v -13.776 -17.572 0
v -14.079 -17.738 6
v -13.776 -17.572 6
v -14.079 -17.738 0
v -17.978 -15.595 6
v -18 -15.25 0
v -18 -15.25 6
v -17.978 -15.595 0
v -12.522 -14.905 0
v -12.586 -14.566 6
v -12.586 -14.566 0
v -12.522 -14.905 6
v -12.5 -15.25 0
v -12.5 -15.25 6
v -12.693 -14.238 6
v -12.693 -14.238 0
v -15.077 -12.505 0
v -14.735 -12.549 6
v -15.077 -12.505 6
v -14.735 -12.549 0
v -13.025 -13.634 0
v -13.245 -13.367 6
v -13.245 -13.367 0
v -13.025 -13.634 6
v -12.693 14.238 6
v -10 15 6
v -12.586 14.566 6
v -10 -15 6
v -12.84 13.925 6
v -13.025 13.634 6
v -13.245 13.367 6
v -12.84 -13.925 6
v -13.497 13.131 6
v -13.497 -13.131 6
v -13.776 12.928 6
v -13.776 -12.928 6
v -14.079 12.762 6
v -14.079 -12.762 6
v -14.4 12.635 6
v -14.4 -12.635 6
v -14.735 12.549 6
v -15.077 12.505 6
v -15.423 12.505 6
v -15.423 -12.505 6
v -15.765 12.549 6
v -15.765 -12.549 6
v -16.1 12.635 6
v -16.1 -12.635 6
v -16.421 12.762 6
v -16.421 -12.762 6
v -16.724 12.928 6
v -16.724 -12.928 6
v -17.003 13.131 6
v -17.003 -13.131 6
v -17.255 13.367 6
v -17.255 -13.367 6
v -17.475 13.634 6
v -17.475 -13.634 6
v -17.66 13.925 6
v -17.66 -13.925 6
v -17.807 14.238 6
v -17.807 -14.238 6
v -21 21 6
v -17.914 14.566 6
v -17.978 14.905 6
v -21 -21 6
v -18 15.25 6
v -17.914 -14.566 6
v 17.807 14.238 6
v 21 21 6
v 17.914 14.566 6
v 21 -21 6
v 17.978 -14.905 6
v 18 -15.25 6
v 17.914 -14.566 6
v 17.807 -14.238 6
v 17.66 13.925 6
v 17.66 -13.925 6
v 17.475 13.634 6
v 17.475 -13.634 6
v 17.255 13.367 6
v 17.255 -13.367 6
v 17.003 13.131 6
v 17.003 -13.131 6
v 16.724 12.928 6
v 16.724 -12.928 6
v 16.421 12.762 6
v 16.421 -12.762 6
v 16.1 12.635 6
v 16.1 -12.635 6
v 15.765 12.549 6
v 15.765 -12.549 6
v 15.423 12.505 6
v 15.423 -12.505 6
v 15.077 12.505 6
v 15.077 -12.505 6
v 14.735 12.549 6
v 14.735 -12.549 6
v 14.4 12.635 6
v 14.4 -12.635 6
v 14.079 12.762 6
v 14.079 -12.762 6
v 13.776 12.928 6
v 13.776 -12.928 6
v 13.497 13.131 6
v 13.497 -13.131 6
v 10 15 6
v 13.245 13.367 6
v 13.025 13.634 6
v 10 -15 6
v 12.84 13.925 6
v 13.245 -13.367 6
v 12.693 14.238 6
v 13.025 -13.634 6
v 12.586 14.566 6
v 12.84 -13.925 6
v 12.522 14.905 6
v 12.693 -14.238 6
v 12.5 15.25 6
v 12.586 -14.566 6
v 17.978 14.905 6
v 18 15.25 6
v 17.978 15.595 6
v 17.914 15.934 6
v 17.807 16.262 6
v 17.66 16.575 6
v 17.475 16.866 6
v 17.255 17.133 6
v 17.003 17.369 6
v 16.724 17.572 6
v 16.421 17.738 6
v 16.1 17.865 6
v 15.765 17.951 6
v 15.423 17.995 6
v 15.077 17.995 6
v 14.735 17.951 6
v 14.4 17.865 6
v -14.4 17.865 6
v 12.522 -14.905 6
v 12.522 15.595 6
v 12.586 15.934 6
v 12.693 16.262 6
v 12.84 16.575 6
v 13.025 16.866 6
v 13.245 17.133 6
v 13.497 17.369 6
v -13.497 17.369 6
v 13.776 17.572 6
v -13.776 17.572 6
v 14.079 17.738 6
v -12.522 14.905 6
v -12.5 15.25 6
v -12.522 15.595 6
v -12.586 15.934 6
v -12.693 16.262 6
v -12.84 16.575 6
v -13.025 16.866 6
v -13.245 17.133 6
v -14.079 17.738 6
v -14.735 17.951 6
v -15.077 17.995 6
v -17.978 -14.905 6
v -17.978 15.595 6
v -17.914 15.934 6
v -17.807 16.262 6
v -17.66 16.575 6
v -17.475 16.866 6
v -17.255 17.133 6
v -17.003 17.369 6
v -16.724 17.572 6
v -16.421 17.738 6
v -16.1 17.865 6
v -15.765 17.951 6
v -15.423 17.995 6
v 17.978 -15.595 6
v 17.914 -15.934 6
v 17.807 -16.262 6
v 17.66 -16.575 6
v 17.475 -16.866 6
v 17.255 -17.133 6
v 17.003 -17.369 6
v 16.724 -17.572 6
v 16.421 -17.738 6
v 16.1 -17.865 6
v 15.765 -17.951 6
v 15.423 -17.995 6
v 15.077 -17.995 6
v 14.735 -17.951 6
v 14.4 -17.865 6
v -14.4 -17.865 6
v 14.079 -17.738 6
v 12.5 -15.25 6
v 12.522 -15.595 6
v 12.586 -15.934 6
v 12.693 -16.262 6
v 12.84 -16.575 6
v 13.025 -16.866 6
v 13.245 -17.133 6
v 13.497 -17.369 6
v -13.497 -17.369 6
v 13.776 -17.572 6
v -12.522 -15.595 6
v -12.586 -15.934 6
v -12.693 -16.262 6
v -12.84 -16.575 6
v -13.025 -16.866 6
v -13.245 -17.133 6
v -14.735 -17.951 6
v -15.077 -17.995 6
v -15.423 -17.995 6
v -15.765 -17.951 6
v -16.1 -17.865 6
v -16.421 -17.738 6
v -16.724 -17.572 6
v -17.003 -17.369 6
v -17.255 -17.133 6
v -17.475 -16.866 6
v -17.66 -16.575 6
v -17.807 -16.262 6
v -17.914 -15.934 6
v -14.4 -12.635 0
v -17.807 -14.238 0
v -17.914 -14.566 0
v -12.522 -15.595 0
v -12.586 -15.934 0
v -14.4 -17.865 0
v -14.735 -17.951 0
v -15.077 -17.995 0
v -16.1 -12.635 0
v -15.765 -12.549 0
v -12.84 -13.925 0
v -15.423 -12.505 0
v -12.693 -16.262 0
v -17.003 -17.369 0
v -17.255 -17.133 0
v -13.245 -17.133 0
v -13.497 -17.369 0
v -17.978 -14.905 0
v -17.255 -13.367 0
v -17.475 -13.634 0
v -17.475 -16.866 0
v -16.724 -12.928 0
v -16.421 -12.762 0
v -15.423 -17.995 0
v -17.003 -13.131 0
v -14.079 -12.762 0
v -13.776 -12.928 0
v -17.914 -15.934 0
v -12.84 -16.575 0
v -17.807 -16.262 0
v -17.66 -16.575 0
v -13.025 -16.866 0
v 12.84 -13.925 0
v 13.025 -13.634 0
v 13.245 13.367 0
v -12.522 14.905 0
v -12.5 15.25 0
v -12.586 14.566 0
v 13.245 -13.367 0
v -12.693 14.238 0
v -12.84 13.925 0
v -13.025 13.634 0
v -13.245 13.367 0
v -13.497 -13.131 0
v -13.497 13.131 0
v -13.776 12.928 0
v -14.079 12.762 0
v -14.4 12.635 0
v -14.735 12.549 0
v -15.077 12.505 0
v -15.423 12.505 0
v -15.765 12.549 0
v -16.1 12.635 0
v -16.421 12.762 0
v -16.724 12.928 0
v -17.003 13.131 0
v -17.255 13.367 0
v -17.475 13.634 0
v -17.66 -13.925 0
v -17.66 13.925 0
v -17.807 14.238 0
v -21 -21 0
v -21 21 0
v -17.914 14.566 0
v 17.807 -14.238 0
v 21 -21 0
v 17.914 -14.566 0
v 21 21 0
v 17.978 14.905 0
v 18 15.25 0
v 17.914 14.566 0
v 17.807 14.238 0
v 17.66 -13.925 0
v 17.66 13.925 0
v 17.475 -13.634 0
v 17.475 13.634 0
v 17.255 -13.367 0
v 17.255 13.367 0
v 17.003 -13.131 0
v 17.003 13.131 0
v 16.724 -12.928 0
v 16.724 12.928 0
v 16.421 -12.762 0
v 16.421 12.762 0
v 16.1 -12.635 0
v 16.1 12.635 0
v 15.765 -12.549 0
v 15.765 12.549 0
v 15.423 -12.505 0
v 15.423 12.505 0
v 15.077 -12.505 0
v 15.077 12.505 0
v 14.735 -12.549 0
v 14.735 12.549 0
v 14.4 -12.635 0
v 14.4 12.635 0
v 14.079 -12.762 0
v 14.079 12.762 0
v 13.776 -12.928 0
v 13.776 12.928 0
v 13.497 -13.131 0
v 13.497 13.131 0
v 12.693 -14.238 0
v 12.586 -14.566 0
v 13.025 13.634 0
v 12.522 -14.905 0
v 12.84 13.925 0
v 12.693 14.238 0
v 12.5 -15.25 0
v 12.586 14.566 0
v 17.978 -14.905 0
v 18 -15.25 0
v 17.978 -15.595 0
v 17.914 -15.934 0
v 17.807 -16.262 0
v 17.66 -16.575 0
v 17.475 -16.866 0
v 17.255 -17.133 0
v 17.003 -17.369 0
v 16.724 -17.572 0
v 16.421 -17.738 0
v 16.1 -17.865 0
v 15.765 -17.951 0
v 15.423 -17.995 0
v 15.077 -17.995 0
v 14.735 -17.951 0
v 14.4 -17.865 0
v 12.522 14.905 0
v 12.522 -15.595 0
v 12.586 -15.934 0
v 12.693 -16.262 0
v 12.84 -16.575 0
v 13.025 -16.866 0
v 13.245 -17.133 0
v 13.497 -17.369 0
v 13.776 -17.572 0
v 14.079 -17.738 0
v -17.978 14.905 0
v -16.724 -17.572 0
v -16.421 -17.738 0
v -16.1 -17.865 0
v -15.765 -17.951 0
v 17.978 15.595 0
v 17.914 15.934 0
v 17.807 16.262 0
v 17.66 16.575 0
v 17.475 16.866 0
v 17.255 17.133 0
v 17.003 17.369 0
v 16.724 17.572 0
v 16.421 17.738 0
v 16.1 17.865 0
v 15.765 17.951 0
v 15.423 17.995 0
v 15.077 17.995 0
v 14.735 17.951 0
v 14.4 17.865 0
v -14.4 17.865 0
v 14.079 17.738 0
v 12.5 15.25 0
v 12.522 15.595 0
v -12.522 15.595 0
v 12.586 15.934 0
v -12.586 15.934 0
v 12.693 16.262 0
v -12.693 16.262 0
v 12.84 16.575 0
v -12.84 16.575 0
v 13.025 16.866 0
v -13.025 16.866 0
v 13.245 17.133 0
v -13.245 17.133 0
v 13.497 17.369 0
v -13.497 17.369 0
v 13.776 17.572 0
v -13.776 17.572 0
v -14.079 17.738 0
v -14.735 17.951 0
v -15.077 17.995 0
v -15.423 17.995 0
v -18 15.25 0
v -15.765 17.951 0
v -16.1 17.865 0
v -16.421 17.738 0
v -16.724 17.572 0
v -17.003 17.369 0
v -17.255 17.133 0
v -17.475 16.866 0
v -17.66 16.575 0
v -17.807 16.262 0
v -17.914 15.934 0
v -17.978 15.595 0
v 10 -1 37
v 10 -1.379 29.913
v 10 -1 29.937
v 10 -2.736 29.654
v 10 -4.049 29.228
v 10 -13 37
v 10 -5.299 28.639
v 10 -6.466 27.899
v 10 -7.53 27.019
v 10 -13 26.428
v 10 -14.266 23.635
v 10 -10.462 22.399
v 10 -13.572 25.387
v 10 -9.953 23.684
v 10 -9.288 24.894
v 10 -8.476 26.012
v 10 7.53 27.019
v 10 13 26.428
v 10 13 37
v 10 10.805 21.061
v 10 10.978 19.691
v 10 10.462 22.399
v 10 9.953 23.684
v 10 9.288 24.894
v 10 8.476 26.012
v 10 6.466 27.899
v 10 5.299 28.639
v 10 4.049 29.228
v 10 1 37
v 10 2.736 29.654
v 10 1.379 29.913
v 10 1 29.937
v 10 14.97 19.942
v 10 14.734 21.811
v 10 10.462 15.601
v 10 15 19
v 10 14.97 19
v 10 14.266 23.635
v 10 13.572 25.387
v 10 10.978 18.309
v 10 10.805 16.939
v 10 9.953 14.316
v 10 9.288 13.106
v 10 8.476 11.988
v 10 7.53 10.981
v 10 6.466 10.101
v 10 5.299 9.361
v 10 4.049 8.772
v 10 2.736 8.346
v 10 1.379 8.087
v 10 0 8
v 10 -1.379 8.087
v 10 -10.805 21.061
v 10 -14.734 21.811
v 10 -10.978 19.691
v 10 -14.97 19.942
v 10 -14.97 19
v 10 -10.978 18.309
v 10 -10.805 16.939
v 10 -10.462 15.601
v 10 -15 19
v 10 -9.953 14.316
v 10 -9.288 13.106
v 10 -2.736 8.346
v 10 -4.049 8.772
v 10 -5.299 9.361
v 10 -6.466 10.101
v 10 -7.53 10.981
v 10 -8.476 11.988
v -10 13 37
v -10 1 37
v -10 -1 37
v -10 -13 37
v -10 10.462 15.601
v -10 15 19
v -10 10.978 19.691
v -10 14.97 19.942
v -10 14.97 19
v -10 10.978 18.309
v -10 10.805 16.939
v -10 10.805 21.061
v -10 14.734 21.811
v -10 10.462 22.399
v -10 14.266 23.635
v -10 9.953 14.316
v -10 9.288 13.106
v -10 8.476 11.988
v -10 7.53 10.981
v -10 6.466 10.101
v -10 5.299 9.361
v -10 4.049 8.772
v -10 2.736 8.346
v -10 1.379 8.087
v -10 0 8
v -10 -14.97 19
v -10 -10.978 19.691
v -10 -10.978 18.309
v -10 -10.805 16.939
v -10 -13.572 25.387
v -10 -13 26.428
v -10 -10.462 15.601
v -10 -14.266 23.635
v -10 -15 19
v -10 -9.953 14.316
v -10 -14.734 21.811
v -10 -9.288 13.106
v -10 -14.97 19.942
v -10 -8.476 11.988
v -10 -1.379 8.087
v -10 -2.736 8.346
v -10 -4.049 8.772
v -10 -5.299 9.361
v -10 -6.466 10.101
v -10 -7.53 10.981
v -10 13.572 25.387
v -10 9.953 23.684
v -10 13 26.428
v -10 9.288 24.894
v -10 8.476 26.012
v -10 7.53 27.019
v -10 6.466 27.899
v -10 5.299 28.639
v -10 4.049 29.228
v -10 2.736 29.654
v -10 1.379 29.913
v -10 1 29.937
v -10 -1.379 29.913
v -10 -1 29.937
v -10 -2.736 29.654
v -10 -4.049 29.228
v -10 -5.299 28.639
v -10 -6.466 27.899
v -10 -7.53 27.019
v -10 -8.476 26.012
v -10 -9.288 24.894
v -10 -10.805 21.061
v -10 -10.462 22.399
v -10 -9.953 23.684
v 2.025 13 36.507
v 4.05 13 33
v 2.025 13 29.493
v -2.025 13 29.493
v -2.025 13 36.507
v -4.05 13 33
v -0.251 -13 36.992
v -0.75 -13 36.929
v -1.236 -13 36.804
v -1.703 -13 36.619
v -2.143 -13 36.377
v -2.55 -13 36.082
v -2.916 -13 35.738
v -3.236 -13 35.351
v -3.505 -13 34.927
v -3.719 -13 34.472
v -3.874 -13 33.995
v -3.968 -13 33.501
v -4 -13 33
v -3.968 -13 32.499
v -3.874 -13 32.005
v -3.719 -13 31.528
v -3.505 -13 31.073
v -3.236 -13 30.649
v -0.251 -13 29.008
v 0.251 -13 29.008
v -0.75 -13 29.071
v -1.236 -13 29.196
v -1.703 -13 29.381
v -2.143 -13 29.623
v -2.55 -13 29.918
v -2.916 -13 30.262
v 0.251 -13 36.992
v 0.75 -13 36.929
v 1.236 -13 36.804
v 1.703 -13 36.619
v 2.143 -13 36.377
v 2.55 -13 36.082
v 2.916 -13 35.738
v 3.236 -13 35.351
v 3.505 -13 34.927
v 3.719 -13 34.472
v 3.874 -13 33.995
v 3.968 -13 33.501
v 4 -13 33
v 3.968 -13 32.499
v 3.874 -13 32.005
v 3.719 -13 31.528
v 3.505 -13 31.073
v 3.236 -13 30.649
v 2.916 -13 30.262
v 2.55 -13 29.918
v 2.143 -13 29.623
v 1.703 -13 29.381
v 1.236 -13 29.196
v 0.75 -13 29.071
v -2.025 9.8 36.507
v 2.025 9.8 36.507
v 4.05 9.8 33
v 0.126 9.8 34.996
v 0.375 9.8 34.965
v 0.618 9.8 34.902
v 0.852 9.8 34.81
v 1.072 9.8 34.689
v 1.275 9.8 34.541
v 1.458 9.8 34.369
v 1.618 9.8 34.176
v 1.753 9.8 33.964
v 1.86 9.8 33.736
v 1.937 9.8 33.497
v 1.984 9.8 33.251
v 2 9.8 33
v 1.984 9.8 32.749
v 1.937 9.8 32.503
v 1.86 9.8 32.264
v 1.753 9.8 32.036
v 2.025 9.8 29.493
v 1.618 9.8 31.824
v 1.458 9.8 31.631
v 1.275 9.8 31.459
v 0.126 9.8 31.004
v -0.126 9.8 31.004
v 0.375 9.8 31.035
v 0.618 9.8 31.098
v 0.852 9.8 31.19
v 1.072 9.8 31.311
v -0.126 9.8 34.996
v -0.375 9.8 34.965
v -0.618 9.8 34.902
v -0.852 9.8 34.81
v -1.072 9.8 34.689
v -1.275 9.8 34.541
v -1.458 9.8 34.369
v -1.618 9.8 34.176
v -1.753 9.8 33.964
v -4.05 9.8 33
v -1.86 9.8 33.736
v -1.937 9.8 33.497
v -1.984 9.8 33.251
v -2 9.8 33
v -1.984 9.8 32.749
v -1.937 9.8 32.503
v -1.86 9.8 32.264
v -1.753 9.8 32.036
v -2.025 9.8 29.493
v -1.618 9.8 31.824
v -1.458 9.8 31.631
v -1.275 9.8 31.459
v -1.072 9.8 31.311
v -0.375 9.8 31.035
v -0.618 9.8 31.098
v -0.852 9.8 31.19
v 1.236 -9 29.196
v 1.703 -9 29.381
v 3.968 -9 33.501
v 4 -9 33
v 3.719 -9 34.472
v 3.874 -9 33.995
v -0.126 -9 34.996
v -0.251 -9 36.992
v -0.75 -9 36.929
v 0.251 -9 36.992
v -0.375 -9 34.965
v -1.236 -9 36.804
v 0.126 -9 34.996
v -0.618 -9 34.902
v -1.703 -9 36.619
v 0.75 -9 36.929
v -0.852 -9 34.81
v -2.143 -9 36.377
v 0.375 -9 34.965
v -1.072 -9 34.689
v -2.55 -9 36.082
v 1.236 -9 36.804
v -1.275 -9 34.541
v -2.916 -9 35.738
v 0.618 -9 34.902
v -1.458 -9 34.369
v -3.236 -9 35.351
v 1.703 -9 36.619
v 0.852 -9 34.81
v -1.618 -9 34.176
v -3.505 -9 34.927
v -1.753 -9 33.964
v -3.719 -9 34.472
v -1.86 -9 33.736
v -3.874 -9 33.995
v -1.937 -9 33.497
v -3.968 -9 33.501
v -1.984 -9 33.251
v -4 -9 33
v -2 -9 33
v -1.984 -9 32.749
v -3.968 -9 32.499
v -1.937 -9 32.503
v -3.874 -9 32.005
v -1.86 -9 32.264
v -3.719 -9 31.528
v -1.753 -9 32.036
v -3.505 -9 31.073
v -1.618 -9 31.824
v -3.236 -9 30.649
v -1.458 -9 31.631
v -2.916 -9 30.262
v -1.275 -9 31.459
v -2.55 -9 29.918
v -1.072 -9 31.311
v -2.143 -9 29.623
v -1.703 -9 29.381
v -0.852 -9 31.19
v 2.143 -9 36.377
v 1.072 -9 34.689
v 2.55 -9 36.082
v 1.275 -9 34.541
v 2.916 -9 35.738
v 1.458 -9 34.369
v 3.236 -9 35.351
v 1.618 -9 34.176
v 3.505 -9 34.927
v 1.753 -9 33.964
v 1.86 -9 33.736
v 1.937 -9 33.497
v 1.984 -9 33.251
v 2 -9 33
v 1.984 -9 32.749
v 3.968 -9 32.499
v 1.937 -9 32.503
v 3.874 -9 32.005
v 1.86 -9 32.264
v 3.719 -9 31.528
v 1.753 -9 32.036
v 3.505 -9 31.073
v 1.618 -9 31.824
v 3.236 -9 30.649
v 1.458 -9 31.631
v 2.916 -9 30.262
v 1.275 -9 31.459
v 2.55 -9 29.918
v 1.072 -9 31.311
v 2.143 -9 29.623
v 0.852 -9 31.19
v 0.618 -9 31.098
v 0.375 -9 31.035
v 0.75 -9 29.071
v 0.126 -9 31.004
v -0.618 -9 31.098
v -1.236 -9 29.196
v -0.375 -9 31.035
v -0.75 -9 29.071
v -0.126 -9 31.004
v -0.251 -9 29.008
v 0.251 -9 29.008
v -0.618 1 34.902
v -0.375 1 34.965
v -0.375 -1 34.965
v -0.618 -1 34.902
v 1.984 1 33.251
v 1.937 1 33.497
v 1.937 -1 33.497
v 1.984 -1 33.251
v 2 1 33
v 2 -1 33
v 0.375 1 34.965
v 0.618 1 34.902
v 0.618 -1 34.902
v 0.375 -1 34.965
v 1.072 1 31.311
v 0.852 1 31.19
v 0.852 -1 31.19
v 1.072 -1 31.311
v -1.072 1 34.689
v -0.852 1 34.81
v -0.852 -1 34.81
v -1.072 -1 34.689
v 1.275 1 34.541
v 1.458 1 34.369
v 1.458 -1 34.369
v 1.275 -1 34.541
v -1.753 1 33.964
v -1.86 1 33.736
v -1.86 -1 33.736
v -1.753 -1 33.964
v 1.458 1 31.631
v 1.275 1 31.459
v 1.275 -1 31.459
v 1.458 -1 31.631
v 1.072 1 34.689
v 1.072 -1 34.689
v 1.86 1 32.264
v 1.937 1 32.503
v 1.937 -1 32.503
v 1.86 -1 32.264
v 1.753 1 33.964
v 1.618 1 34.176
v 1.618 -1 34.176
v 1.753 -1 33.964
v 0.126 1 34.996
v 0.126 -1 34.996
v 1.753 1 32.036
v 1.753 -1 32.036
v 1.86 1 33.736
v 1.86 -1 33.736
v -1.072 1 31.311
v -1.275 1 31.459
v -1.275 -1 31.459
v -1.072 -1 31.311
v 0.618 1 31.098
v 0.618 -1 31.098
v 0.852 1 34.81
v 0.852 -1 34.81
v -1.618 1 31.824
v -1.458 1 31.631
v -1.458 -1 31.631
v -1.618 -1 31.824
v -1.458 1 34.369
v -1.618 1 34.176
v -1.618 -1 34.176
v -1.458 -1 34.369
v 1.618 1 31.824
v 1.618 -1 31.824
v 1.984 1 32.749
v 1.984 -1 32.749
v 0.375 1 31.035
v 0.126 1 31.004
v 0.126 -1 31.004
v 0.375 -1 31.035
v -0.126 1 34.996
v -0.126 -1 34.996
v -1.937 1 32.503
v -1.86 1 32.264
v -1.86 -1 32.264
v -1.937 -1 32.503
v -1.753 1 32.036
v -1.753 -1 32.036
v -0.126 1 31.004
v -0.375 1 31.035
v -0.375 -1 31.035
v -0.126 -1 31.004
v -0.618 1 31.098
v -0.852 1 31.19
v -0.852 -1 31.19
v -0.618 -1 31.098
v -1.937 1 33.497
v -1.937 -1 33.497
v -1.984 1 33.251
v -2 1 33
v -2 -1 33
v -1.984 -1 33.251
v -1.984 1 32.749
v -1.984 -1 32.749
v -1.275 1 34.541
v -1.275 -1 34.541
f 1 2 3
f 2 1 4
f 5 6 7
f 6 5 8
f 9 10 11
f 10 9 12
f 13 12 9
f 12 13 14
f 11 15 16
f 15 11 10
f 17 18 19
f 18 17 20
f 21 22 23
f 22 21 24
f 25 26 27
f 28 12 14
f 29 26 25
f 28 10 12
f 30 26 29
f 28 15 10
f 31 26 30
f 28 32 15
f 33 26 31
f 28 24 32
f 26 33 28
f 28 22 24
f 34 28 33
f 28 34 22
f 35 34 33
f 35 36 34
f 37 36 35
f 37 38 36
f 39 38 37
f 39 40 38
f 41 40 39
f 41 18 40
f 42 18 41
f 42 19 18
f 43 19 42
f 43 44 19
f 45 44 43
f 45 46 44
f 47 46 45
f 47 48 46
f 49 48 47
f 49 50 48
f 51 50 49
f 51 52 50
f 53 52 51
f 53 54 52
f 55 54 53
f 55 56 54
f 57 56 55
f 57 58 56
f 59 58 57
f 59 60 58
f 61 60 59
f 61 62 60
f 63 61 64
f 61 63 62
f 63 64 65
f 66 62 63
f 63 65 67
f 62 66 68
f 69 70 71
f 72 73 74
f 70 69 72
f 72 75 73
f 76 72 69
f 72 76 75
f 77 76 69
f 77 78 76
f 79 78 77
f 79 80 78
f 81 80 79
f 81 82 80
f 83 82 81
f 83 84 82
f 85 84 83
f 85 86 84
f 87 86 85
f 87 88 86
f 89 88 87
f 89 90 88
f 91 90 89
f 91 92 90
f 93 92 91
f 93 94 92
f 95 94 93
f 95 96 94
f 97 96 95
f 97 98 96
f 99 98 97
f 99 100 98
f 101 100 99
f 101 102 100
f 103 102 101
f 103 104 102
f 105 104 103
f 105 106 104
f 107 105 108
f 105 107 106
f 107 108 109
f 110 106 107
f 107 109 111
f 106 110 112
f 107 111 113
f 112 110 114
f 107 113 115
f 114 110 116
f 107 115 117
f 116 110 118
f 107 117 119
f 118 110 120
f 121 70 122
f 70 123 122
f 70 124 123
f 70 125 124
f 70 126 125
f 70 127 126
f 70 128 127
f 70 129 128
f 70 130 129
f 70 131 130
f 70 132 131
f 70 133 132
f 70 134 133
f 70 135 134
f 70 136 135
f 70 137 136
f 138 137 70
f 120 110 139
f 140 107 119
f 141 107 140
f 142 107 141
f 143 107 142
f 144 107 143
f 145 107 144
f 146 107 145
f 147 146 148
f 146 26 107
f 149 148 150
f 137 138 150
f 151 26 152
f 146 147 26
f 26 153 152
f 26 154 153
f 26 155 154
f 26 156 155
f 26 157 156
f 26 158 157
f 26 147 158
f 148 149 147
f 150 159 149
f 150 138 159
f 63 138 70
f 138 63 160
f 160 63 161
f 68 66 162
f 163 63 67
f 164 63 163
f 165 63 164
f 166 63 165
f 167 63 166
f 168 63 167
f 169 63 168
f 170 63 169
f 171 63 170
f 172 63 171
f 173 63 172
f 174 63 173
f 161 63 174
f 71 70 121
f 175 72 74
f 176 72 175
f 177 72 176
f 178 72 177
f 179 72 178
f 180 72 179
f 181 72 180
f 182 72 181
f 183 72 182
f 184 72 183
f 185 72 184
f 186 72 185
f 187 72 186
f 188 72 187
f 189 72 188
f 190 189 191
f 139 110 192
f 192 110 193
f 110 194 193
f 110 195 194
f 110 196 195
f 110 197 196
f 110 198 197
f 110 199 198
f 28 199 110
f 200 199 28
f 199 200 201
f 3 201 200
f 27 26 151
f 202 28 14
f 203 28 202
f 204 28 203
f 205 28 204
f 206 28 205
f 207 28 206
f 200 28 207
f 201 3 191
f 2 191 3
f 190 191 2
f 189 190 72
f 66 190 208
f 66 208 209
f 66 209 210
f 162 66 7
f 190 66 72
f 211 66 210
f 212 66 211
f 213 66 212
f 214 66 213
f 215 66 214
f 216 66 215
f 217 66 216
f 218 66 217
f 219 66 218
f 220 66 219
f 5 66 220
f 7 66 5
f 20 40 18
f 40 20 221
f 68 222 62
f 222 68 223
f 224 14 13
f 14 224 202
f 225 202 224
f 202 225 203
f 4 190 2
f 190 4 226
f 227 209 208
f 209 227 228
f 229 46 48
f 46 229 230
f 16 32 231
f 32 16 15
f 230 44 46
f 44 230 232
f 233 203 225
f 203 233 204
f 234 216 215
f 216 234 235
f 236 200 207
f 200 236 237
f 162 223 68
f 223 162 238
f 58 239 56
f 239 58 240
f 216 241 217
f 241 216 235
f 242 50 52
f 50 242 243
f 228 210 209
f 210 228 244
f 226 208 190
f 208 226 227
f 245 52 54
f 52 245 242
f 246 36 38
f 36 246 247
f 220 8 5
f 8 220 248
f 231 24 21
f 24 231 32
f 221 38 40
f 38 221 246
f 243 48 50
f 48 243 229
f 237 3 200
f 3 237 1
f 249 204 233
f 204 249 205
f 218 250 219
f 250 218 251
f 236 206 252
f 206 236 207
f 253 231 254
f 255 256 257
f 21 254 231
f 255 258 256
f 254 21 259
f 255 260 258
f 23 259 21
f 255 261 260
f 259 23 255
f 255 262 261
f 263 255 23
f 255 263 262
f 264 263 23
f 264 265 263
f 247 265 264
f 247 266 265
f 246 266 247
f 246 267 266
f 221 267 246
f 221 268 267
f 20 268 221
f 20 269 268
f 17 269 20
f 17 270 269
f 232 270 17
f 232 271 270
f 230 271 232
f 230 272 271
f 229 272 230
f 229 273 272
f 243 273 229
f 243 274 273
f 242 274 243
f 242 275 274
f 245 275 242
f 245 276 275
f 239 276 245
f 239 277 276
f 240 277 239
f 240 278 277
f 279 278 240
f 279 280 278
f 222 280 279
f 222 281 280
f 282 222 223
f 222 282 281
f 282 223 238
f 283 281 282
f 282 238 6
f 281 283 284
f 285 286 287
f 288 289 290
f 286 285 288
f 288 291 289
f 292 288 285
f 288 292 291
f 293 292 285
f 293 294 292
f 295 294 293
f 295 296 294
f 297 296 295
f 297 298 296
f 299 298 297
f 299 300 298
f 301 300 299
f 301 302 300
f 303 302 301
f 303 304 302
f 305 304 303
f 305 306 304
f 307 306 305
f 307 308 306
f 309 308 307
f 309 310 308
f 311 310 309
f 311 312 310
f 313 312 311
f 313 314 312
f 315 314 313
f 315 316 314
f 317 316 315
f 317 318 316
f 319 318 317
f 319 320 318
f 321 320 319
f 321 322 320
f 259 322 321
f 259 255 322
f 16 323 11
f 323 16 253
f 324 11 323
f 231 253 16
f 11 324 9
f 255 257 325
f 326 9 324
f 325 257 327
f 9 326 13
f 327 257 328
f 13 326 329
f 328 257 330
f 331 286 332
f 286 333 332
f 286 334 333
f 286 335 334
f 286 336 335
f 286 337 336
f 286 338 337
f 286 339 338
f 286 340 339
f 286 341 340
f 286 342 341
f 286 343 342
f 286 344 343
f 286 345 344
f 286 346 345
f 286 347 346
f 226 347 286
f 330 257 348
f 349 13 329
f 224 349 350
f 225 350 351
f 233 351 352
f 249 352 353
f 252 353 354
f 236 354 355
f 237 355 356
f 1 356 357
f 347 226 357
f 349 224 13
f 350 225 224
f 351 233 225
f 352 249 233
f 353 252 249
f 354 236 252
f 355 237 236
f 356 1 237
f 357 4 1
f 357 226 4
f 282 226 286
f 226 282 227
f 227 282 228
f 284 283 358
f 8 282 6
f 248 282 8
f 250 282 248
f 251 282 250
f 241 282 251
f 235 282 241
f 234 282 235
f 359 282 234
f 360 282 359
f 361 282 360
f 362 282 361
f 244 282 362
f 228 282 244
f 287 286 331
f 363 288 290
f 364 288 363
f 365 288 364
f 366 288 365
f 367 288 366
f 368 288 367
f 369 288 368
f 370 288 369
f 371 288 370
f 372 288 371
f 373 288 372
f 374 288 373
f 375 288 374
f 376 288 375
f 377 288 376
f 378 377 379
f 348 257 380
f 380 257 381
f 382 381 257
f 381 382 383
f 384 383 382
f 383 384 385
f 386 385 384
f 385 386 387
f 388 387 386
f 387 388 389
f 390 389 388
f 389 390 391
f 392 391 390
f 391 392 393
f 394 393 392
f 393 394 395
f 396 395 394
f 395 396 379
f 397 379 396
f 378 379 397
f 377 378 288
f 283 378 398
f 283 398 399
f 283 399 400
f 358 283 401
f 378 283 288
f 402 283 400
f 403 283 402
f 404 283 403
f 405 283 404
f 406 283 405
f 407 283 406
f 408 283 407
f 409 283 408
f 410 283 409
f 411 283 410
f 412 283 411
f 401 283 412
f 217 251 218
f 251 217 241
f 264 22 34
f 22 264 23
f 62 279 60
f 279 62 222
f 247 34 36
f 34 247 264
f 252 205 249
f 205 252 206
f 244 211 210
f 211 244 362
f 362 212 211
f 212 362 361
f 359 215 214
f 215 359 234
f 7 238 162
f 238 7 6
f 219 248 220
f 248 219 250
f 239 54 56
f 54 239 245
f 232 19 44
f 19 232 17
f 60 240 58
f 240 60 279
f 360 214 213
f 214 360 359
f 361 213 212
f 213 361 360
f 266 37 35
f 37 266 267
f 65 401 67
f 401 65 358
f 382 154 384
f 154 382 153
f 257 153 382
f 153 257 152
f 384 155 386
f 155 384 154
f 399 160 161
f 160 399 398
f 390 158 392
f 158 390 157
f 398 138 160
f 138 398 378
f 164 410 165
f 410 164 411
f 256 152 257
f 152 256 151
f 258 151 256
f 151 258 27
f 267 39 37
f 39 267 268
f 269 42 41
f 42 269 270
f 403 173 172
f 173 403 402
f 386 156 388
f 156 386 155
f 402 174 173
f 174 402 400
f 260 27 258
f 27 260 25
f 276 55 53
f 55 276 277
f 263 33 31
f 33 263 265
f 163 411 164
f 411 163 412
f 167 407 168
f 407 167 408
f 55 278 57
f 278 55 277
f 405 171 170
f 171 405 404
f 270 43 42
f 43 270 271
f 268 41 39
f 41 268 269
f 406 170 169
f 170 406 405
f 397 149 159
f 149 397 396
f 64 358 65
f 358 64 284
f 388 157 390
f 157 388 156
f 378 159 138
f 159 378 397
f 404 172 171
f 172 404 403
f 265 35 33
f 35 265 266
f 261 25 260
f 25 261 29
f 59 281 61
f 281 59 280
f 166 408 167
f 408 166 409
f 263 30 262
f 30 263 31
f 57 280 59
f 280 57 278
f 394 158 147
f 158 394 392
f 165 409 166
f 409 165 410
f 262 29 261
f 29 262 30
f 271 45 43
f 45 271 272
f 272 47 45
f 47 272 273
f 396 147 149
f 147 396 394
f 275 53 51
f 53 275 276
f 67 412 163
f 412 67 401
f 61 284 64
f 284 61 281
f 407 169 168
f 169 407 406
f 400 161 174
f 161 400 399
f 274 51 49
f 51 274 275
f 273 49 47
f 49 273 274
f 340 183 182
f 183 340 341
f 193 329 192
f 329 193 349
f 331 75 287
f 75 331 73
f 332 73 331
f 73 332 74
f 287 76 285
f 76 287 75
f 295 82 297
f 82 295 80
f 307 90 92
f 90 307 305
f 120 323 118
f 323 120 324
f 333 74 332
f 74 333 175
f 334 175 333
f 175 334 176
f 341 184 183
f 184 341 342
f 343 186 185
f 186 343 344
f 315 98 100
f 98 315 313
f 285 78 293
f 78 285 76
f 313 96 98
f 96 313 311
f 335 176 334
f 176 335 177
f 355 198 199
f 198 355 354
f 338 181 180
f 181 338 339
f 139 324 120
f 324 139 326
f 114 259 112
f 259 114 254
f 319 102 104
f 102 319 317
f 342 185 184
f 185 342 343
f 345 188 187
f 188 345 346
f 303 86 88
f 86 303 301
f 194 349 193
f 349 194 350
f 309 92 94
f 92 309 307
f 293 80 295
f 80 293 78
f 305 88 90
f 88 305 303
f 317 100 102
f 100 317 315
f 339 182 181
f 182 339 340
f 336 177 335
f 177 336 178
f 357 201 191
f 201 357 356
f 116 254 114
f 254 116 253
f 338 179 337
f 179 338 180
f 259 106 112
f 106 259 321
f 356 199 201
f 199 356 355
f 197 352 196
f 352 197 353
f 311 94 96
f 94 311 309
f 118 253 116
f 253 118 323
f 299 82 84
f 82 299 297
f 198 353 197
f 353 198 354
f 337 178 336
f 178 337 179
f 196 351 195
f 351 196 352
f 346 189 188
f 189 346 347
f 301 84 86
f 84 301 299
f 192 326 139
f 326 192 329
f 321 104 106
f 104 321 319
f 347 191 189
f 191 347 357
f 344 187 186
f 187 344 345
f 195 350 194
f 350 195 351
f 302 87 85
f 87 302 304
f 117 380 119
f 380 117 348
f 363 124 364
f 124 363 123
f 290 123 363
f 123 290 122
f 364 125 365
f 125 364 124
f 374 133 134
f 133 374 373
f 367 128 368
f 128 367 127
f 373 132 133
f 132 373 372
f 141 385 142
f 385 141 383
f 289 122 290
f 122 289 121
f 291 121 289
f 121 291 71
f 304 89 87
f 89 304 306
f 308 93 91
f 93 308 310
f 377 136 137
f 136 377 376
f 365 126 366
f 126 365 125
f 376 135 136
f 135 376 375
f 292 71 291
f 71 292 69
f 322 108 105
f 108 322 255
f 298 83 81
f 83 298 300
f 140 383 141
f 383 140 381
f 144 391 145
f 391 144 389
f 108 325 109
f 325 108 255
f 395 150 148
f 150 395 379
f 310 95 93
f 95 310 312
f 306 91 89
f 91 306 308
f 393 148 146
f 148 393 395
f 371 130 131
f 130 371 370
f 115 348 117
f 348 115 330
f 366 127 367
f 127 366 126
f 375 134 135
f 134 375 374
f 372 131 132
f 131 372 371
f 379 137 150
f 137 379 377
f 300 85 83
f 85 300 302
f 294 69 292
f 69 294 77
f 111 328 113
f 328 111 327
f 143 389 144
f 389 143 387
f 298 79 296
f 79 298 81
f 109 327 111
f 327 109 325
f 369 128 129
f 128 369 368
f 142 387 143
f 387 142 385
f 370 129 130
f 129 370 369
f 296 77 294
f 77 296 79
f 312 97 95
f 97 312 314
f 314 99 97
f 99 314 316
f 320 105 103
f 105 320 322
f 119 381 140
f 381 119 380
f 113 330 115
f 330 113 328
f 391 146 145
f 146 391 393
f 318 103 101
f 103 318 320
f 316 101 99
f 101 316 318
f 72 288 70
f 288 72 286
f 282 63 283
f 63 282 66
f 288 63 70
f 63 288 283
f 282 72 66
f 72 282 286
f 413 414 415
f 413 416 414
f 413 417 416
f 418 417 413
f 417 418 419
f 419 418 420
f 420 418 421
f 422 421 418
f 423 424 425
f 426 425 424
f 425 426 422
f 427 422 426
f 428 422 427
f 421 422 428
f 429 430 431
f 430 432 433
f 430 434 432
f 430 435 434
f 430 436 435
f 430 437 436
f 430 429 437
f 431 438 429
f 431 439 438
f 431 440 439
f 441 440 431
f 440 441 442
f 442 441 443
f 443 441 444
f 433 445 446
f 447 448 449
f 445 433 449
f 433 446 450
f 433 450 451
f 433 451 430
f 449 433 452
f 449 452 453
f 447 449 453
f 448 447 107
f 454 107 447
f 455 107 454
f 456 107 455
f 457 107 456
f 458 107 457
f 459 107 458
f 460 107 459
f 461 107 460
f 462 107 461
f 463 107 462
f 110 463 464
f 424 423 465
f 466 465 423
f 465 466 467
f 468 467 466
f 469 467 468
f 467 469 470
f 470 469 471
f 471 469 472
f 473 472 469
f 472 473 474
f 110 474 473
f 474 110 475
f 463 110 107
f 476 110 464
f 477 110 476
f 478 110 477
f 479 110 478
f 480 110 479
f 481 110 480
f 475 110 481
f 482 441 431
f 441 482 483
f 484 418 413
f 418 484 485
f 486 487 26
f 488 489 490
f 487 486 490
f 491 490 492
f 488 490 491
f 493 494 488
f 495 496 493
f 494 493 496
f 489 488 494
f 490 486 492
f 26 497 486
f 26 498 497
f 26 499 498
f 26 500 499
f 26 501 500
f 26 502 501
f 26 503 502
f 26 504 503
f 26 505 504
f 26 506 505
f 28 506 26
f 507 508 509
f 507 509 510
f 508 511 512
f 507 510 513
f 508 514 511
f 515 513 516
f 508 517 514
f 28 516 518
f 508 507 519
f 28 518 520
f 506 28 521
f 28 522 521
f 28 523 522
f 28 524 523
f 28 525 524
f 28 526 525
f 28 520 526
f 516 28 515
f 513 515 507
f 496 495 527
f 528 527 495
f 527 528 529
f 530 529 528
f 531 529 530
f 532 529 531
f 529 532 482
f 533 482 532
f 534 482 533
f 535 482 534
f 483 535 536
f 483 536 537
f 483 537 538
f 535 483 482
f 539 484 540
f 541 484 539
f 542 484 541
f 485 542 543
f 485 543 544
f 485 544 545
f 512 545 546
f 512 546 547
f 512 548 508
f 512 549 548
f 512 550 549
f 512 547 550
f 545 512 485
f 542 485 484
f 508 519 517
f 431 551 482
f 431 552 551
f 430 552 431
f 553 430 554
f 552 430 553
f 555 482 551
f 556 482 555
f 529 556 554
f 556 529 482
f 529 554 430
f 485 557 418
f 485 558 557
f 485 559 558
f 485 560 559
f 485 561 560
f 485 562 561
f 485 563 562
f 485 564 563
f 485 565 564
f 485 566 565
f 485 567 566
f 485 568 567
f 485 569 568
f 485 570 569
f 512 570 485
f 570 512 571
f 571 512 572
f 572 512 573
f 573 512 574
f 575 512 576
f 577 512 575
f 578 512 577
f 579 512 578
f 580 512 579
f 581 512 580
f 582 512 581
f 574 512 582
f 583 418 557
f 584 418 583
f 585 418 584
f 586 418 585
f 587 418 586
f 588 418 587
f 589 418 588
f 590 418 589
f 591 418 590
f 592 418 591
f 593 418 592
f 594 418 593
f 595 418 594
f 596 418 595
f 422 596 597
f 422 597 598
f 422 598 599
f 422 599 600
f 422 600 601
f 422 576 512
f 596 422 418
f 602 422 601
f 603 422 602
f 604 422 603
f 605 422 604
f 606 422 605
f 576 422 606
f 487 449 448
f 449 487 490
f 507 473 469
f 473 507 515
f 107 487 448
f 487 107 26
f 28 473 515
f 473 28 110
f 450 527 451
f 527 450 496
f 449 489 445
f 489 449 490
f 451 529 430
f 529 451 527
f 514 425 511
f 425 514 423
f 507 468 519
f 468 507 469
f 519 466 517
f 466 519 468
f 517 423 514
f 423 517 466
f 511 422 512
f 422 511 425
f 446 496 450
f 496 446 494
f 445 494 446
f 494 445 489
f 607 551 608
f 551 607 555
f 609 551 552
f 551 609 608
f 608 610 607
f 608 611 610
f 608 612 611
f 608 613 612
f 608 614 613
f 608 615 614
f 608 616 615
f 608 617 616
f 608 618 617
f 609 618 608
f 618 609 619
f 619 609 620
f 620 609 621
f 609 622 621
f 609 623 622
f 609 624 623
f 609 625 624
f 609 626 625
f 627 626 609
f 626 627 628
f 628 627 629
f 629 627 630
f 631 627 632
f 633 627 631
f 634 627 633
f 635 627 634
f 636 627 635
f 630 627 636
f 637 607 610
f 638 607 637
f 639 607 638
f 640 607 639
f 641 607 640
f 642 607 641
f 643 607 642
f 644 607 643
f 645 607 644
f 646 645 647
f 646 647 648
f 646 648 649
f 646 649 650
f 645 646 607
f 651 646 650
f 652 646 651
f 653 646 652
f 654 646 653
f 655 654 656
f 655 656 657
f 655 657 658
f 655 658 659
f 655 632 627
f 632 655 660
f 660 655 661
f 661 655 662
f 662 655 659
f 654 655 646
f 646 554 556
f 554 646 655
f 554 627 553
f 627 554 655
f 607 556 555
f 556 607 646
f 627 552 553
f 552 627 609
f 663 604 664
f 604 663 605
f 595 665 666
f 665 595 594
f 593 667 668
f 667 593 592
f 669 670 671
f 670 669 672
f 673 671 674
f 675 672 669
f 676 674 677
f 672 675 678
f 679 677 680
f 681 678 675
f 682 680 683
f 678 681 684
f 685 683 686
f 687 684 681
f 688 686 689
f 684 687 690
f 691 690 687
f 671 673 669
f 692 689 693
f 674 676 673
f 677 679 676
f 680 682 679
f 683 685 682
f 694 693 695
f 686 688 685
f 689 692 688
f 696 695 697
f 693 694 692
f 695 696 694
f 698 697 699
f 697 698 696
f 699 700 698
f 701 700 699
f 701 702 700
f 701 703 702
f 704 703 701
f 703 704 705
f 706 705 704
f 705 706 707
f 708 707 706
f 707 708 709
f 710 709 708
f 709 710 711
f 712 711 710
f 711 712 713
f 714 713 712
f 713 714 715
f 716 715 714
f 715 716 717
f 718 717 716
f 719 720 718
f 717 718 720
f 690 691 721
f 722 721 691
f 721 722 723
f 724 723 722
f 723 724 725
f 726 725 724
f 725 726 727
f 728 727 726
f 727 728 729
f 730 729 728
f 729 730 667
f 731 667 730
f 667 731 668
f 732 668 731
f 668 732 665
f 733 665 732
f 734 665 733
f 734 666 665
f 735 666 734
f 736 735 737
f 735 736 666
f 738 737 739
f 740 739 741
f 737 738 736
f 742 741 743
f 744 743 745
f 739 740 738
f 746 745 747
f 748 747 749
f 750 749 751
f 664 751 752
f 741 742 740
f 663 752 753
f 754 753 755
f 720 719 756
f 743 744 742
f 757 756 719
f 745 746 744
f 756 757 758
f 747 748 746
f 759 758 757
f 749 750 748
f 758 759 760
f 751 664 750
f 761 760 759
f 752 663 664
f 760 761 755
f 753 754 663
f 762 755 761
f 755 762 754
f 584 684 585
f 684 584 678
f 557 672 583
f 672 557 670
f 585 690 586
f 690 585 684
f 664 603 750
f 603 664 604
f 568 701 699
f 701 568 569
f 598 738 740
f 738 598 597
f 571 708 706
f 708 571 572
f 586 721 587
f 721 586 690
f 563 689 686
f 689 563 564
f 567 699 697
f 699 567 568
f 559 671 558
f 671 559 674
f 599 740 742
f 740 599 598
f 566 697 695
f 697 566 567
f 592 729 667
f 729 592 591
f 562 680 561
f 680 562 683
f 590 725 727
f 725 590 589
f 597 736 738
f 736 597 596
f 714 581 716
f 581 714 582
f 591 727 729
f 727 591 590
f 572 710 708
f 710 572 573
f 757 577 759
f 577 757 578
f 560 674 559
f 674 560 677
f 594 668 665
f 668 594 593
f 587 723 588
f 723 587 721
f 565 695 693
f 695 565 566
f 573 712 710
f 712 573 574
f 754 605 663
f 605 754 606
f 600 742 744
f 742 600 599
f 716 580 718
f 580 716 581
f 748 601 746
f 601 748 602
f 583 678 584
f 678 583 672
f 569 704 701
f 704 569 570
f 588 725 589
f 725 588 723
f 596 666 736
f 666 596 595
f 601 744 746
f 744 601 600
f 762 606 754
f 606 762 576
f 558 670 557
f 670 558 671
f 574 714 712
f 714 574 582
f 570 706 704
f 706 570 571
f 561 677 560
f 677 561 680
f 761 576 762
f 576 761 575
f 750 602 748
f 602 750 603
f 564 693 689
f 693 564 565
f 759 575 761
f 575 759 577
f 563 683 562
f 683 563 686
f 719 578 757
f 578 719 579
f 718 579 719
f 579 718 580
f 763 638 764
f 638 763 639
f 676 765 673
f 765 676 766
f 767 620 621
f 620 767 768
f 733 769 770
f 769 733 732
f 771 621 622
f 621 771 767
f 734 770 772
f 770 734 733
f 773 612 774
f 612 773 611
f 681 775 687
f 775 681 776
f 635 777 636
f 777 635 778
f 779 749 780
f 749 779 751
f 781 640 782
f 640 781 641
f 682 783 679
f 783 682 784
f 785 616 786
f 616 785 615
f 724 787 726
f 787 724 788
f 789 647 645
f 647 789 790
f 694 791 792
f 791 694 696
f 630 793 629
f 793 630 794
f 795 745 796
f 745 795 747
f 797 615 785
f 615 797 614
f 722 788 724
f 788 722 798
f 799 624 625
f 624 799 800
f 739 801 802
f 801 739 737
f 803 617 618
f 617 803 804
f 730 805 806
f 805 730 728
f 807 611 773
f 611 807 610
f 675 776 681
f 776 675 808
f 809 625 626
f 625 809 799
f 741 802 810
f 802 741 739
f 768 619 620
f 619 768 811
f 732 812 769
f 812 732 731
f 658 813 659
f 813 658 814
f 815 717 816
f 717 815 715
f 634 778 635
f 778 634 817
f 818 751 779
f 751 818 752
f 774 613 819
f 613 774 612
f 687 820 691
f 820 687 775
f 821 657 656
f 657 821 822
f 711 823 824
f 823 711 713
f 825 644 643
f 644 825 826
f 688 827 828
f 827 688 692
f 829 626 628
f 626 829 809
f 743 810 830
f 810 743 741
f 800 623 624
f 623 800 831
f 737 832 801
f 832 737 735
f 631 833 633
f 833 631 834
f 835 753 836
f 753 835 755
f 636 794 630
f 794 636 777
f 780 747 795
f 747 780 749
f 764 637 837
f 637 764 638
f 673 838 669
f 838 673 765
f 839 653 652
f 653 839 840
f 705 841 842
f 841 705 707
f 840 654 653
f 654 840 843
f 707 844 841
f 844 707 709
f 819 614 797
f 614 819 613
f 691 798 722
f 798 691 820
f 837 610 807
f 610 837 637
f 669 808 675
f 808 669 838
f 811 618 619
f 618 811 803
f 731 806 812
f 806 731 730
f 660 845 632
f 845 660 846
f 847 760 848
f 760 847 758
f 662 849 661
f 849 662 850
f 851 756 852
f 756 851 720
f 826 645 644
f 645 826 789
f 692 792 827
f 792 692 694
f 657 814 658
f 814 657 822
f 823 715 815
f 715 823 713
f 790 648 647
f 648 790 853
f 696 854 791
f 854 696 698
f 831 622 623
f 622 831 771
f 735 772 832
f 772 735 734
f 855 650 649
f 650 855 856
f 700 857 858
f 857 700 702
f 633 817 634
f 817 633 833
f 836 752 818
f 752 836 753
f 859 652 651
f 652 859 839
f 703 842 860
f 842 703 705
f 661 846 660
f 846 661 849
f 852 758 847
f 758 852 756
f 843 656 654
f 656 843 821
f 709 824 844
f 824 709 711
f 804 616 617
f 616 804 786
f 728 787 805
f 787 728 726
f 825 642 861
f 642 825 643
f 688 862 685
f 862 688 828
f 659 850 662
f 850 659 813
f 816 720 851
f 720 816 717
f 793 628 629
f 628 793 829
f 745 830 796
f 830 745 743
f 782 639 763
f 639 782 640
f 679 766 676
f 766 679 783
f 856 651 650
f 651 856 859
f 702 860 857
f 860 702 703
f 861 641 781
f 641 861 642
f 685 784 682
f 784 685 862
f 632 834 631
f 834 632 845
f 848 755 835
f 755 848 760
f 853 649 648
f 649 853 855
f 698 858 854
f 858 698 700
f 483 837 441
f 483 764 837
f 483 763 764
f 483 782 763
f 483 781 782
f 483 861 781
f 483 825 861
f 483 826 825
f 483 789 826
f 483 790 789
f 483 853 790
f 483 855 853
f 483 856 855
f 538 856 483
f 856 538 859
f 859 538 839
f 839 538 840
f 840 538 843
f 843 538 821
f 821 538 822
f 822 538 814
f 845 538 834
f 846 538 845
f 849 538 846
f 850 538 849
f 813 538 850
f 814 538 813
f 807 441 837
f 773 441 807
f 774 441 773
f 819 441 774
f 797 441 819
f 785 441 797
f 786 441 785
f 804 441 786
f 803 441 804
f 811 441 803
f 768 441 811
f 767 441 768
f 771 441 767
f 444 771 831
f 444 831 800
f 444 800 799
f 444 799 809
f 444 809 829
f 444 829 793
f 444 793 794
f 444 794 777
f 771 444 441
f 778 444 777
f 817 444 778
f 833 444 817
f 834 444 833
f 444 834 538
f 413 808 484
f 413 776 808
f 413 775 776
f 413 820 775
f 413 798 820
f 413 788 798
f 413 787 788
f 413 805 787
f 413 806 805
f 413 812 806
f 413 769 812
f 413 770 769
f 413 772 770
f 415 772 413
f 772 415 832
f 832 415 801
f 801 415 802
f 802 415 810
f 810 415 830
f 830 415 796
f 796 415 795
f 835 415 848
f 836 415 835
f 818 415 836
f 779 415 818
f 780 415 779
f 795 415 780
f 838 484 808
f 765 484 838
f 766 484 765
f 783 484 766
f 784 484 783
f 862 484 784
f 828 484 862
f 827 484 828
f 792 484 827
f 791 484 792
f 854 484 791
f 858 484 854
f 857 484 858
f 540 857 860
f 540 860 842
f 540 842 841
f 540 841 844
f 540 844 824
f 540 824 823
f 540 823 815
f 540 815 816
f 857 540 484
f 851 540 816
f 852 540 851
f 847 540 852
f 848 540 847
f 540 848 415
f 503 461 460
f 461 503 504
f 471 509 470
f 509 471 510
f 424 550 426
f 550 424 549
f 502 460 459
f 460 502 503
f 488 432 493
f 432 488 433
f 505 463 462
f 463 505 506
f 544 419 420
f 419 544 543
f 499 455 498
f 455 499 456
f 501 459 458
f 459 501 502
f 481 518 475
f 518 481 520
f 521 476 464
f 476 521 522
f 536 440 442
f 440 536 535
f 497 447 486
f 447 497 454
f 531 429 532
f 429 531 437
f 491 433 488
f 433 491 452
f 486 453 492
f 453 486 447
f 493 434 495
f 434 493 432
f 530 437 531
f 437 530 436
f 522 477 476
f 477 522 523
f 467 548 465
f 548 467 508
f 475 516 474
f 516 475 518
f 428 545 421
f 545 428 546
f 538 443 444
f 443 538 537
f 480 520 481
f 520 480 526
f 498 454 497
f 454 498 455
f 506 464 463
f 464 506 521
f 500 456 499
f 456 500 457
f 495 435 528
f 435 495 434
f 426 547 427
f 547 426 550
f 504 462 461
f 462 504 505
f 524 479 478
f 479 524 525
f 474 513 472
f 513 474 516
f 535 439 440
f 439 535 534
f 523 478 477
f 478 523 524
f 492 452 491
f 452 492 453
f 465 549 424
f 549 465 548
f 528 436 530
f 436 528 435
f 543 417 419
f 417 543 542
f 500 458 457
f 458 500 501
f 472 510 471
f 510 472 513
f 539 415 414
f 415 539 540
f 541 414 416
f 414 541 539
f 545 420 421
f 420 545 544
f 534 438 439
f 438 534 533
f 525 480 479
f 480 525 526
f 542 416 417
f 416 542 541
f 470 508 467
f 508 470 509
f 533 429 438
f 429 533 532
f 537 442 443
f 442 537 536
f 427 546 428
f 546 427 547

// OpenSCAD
include <MCAD/nuts_and_bolts.scad>;

$fn=50;
// Tolerances for geometry connections.
AT=0.02;
ST=AT*2;
TT=AT/2;


module pillowBlock(centerHeight = 19, width=20)

// Separation between plates:
// 23mm to center of rail from bottom plate
// 15mm to center of rail from top plate
// 38mm total...

// NEMA14 height is (max) 35mm so we want center at least 17.5mm from bottom plate
// Call it 18mm, so we want 20mm (max) from top plate
{
  difference()
  {
    union()
    {
      translate([-bearingWidth/2,-bearingWidth/2,0])
      {
        difference()
        {
          cube([bearingWidth,bearingWidth,6]);
          bearingHoles(h=6,csk=false);
        }
      }
      translate([-width/2,-13,6])
        cube([width,26,31]);
      translate([-width/2,-15,6])
        cube([width,30,centerHeight-6]);
      translate([-width/2,0,centerHeight])
        rotate([0,90,0])
          cylinder(r=15,h=width);
    }
    translate([0,13,centerHeight+11+3])
      rotate([90,0,0])
        nutHole(4);
    translate([0,-9,centerHeight+11+3])
      rotate([90,0,0])
        cylinder(r=4,h=4);
    translate([0,22,centerHeight+11+3])
      rotate([90,0,0])
        cylinder(r=2,h=44);
    translate([-width/2,-1,20])
      cube([width,2,20]);
    translate([-width/2-1,0,centerHeight])
      rotate([0,90,0])
        cylinder(h=width+2,r=11);
  }
}

module nemaMount(mount_total_height = 35, shaft_height = 19)
{
// Nema mount
  
  NemaSideSize = 43.5;   // Allow a bit of tolerance
  NemaDistanceBetweenMountingHoles =  31.04;
  NemaMountingHoleDiameter = 4;
  NemaRoundExtrusionDiameter = 24;  // 22 in theory but give some clearance
  NemaShaftHole = 6;  // 5.5 would do but give some clearance
  NemaRoundExtrusionHeight = 2;
  NemaCornerChamfer = 2;

  mount_wall=3;
  mount_base = NemaSideSize/2 - shaft_height;

  centers=NemaSideSize/2+mount_base;
  difference()
  {
    translate([-(NemaSideSize+mount_wall*2)/2,0,0])
      cube([NemaSideSize+mount_wall*2, centers+NemaSideSize/2,mount_total_height]);
    translate([-NemaSideSize/2,centers-NemaSideSize/2,mount_wall])
      difference()
      {
        cube([NemaSideSize,NemaSideSize,mount_total_height]);
        rotate([90,0,90])
          prism(mount_total_height, NemaCornerChamfer, NemaCornerChamfer);
        translate([NemaSideSize,0,0])
          rotate([90,0,180])
            prism(mount_total_height, NemaCornerChamfer, NemaCornerChamfer);
        translate([0,NemaSideSize,0])
          rotate([90,0,0])
            prism(mount_total_height, NemaCornerChamfer, NemaCornerChamfer);
        translate([NemaSideSize,NemaSideSize,0])
          rotate([90,0,-90])
            prism(mount_total_height, NemaCornerChamfer, NemaCornerChamfer);
      }
    translate([-(NemaSideSize+mount_wall*2)/2,centers+NemaSideSize/2,mount_total_height+mount_wall])
      translate([-AT,0,0])
        rotate([90,90,0])
          prism(NemaSideSize+mount_wall*2+ST,mount_total_height,NemaSideSize);
    translate([0,centers,mount_wall-NemaRoundExtrusionHeight])
      cylinder(r=NemaRoundExtrusionDiameter/2,h=NemaRoundExtrusionHeight+AT);
    translate([0,centers,-AT])
      cylinder(r=NemaShaftHole/2,h=mount_wall+ST);
    translate([NemaDistanceBetweenMountingHoles/2,centers-NemaDistanceBetweenMountingHoles/2,0])
      cylinder(r=NemaMountingHoleDiameter/2,h=mount_total_height);
    translate([-NemaDistanceBetweenMountingHoles/2,centers-NemaDistanceBetweenMountingHoles/2,0])
      cylinder(r=NemaMountingHoleDiameter/2,h=mount_total_height);
    translate([NemaDistanceBetweenMountingHoles/2,centers+NemaDistanceBetweenMountingHoles/2,0])
      cylinder(r=NemaMountingHoleDiameter/2,h=mount_total_height);
    translate([-NemaDistanceBetweenMountingHoles/2,centers+NemaDistanceBetweenMountingHoles/2,0])
      cylinder(r=NemaMountingHoleDiameter/2,h=mount_total_height);
    translate([0, mount_total_height/2,0])
      rotate([90,0,0])
      {
      translate([NemaDistanceBetweenMountingHoles/2,centers-NemaDistanceBetweenMountingHoles/2,0])
        cylinder(r=NemaMountingHoleDiameter/2,h=mount_total_height);
      translate([-NemaDistanceBetweenMountingHoles/2,centers-NemaDistanceBetweenMountingHoles/2,0])
        cylinder(r=NemaMountingHoleDiameter/2,h=mount_total_height);
      translate([NemaDistanceBetweenMountingHoles/2,centers,0])
        cylinder(r=NemaMountingHoleDiameter/2,h=mount_total_height);
      translate([-NemaDistanceBetweenMountingHoles/2,centers,0])
        cylinder(r=NemaMountingHoleDiameter/2,h=mount_total_height);
      }
    }
}


//Draw a prism based on a 
//right angled triangle
//l - length of prism
//w - width of triangle
//h - height of triangle
module prism(l, w, h) {
       polyhedron(points=[
               [0,0,h],           // 0    front top corner
               [0,0,0],[w,0,0],   // 1, 2 front left & right bottom corners
               [0,l,h],           // 3    back top corner
               [0,l,0],[w,l,0]    // 4, 5 back left & right bottom corners
       ], faces=[ // points for all faces must be ordered clockwise when looking in
               [0,2,1],    // top face
               [3,4,5],    // base face
               [0,1,4,3],  // h face
               [1,2,5,4],  // w face
               [0,3,5,2],  // hypotenuse face
       ]);
}

bearingWidth=42;
bearingHoleSpace=30.5;
bearingHoleEdge=(bearingWidth-bearingHoleSpace)/2;
bearingHoleEdge2=bearingHoleEdge+bearingHoleSpace;
plateThickness=5;
M5HoleRadius=5.5/2;

module csk_bolt(dia,len,csk)
{
  h1=0.6*dia;
  cylinder(r=dia/2,len);
  if(csk)
    translate([0,0,len-h1])
      cylinder(r2=dia,r1=dia/2,h=h1);
}

module bearingHoles(h=plateThickness, csk=true)
{
  translate([bearingHoleEdge,bearingHoleEdge,0])
    csk_bolt(M5HoleRadius*2,h,csk);
  translate([bearingHoleEdge,bearingHoleEdge2,0])
    csk_bolt(M5HoleRadius*2,h,csk);
  translate([bearingHoleEdge2,bearingHoleEdge,0])
    csk_bolt(M5HoleRadius*2,h,csk);
  translate([bearingHoleEdge2,bearingHoleEdge2,0])
    csk_bolt(M5HoleRadius*2,h,csk);
}

module sliderplate()
{
  difference()
  {
    cube([bearingWidth*3,bearingWidth*3,plateThickness]);
    bearingHoles();
    translate([bearingWidth*2,0,0]) bearingHoles();
    translate([0,bearingWidth*2,0]) bearingHoles();
    translate([bearingWidth*2,bearingWidth*2,0]) bearingHoles();
    translate([bearingWidth,bearingWidth*2,0]) bearingHoles();
  }
}

//sliderplate();
pillowBlock();
//nemaMount();
